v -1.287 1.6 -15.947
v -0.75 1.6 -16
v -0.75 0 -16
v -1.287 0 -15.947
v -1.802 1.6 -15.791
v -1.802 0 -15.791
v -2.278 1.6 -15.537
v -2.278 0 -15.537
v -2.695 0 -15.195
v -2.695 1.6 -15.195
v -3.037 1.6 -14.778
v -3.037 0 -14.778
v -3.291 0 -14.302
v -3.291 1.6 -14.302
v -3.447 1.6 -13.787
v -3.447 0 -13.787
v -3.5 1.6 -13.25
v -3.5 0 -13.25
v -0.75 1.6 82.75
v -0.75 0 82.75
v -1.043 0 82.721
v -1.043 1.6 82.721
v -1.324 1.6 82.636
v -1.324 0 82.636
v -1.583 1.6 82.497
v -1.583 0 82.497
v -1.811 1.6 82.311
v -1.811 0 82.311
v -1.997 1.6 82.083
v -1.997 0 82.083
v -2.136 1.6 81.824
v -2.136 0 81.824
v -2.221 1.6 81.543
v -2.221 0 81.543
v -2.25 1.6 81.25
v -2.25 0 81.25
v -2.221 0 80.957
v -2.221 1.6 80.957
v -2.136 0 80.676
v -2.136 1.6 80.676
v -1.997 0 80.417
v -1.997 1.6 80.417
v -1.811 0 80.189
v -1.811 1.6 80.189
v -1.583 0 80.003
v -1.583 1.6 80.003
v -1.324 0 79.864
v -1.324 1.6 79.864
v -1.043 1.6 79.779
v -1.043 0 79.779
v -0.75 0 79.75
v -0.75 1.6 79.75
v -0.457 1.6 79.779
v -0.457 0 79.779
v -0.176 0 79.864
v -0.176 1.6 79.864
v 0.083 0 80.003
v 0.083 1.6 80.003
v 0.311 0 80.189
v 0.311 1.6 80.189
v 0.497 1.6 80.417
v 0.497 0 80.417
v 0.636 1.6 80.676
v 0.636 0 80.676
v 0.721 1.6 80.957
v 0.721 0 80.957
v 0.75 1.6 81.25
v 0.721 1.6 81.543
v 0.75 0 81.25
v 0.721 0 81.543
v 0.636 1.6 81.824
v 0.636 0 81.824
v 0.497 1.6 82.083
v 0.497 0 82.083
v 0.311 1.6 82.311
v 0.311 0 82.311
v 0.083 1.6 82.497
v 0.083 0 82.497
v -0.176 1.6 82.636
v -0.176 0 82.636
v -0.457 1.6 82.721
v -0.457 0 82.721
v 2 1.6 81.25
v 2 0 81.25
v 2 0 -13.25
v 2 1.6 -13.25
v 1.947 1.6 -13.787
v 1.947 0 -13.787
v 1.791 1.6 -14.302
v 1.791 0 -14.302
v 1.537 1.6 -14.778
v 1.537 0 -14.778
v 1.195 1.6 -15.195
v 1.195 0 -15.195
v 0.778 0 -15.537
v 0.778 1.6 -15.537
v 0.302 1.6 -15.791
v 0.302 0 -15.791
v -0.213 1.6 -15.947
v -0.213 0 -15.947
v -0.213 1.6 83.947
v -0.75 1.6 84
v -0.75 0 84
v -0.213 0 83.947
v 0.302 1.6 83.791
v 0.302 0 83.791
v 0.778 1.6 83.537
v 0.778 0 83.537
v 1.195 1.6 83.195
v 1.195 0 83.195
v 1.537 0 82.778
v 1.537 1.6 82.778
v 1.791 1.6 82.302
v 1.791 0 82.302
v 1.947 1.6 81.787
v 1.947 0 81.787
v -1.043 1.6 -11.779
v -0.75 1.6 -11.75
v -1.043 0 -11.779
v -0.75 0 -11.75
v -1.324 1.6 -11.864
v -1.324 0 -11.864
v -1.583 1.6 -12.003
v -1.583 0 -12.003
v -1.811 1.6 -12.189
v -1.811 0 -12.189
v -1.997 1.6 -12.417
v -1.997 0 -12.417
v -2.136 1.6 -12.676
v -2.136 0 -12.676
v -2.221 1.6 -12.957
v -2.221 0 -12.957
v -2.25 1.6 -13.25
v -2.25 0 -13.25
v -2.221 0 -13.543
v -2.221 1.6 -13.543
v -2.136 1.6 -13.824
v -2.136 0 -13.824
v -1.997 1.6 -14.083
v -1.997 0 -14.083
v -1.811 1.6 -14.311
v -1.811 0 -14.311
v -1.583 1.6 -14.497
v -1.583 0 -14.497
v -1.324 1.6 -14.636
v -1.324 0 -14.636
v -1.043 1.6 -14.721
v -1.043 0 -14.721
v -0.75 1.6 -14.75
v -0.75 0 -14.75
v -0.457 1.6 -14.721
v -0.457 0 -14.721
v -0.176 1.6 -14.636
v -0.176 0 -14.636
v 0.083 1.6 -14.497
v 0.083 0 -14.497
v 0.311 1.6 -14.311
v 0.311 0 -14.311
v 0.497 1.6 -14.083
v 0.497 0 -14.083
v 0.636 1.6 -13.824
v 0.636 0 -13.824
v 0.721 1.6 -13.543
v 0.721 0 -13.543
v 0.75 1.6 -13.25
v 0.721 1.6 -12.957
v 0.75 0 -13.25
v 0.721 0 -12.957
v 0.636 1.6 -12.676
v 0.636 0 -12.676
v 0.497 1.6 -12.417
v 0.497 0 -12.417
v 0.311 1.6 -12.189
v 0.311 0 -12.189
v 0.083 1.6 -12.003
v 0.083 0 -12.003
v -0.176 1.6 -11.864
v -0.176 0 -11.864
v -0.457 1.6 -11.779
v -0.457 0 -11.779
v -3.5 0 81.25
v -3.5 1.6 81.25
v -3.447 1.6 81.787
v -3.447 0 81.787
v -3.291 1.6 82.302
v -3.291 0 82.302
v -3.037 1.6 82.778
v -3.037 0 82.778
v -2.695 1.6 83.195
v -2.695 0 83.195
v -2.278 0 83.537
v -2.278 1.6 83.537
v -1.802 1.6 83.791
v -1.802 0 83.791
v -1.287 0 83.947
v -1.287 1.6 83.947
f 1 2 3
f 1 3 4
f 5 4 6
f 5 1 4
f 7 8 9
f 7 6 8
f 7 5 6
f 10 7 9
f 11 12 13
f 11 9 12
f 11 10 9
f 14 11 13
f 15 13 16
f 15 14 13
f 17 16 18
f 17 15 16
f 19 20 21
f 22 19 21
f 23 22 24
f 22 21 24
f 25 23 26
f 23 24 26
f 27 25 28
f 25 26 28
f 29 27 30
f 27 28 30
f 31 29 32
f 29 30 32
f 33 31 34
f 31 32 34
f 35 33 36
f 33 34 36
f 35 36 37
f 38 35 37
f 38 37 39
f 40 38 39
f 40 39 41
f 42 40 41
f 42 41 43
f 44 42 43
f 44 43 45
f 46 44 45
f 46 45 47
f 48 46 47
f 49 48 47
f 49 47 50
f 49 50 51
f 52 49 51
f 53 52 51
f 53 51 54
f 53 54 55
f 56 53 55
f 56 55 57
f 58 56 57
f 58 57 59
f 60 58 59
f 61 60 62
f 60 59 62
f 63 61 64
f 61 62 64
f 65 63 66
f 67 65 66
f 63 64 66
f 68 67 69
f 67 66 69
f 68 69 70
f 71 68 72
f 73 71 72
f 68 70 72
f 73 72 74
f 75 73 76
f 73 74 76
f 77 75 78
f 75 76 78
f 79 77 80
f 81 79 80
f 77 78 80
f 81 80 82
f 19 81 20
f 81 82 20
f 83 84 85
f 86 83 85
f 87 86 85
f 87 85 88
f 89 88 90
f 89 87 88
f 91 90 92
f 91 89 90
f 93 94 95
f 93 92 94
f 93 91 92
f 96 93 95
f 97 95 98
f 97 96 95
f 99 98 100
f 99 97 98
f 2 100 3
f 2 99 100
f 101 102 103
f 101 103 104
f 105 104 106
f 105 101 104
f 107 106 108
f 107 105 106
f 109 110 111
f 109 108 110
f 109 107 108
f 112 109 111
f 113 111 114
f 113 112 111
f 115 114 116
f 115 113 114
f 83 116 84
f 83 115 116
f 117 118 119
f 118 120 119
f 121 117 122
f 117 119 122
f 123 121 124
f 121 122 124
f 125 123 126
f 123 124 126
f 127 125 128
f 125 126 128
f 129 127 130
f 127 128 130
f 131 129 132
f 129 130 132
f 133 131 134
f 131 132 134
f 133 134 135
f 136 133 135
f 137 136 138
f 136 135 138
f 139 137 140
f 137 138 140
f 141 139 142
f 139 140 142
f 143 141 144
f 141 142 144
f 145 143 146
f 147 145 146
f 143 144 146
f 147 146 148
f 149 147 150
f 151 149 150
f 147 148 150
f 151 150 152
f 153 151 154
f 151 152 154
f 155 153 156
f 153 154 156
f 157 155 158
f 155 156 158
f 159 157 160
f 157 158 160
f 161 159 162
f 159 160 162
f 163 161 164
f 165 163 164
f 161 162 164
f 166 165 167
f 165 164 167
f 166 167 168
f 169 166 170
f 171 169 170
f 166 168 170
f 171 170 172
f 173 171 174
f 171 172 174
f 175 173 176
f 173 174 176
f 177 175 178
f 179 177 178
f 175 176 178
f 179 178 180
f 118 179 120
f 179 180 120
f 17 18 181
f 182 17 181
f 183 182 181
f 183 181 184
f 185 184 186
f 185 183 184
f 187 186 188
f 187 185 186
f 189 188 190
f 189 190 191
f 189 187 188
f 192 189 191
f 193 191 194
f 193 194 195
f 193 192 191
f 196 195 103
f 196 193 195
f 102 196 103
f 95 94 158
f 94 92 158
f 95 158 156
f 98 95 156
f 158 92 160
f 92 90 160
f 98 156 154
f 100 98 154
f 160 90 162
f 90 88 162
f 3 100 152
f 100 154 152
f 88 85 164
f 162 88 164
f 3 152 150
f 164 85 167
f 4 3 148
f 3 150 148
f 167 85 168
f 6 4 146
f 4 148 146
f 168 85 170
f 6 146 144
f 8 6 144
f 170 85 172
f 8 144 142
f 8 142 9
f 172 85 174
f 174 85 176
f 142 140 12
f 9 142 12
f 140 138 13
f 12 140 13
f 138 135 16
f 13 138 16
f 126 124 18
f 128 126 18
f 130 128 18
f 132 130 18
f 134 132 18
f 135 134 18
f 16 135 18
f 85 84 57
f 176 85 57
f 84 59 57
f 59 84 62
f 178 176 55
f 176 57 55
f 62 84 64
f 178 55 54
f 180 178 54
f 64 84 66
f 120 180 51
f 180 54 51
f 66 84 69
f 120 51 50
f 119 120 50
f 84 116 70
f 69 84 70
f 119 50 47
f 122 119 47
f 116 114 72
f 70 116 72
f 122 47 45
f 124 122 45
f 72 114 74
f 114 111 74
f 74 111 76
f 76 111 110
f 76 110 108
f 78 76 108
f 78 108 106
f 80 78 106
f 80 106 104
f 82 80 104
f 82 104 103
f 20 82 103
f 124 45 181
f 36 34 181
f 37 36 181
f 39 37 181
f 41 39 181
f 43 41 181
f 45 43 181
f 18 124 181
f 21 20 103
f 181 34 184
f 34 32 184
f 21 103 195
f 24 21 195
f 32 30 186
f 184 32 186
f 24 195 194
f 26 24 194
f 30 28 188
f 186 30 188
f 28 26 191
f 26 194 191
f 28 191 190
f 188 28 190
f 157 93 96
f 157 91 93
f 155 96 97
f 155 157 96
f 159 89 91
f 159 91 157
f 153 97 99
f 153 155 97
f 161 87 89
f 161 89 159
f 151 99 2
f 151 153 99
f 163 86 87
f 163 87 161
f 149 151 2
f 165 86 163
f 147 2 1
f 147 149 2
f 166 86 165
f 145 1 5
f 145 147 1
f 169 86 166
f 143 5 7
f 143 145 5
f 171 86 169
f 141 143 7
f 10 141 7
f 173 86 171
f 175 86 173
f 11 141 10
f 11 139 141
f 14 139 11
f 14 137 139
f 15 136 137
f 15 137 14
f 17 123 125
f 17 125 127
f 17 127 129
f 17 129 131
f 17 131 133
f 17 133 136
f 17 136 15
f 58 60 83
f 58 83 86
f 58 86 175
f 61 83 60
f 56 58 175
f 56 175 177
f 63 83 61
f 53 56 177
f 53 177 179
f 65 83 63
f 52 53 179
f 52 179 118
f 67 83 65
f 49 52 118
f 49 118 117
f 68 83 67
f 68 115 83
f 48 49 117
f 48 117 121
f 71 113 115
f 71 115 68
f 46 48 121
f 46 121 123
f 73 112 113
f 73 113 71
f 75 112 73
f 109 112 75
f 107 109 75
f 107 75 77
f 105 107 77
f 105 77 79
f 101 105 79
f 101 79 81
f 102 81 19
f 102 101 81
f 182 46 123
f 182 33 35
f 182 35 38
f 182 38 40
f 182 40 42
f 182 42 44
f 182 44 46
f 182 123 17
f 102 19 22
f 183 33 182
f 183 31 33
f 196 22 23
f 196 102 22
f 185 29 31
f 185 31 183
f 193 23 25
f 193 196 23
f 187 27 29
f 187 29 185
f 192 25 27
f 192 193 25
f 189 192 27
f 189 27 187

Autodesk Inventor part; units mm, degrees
ref_plane "YZ Plane" through (0, 0, 0) normal (1, 0, 0) x (0, 1, 0)
ref_plane "XZ Plane" through (0, 0, 0) normal (0, 1, 0) x (-1, 0, 0)
ref_plane "XY Plane" through (0, 0, 0) normal (0, 0, 1) x (1, 0, 0)
sketch "Szkic1" plane through (0, 0, 0) normal (0, 1, 0) x (-1, 0, 0)
  line L0 (3.5, 84) -> (-2, 84)
  line L1 (-2, 84) -> (-2, -16)
  line L2 (-2, -16) -> (3.5, -16)
  line L3 (3.5, -16) -> (3.5, 84)
  point P0 (0, 0)
  dimension "d0" = 5.5
  dimension "d1" = 100
extrude "Wyciągnięcie proste1" add sketch "Szkic1" along normal blind 1.6
fillet "Zaokrąglenie1" radius 2.75 4 edges at (-3.5, 0.8, -16) (2, 0.8, -16) (-3.5, 0.8, 84) (2, 0.8, 84)
sketch "Szkic2" plane through (0, 1.6, 0) normal (0, 1, 0) x (1, 0, 0)
  arc A0 (-3.5, -81.25) -> (2, -81.25) centre (-0.75, -81.25) ccw projected
  line L0 (2, -81.25) -> (2, 13.25) projected
  arc A1 (2, 13.25) -> (-3.5, 13.25) centre (-0.75, 13.25) ccw projected
  line L1 (-3.5, 13.25) -> (-3.5, -81.25) projected
  point P0 (0, 0)
hole "Otwór1" at (-0.75, 1.6, 81.25) at (-0.75, 1.6, -13.25) direction (0, -1, 0) diameter 3 end through all
properties part number "belka"
